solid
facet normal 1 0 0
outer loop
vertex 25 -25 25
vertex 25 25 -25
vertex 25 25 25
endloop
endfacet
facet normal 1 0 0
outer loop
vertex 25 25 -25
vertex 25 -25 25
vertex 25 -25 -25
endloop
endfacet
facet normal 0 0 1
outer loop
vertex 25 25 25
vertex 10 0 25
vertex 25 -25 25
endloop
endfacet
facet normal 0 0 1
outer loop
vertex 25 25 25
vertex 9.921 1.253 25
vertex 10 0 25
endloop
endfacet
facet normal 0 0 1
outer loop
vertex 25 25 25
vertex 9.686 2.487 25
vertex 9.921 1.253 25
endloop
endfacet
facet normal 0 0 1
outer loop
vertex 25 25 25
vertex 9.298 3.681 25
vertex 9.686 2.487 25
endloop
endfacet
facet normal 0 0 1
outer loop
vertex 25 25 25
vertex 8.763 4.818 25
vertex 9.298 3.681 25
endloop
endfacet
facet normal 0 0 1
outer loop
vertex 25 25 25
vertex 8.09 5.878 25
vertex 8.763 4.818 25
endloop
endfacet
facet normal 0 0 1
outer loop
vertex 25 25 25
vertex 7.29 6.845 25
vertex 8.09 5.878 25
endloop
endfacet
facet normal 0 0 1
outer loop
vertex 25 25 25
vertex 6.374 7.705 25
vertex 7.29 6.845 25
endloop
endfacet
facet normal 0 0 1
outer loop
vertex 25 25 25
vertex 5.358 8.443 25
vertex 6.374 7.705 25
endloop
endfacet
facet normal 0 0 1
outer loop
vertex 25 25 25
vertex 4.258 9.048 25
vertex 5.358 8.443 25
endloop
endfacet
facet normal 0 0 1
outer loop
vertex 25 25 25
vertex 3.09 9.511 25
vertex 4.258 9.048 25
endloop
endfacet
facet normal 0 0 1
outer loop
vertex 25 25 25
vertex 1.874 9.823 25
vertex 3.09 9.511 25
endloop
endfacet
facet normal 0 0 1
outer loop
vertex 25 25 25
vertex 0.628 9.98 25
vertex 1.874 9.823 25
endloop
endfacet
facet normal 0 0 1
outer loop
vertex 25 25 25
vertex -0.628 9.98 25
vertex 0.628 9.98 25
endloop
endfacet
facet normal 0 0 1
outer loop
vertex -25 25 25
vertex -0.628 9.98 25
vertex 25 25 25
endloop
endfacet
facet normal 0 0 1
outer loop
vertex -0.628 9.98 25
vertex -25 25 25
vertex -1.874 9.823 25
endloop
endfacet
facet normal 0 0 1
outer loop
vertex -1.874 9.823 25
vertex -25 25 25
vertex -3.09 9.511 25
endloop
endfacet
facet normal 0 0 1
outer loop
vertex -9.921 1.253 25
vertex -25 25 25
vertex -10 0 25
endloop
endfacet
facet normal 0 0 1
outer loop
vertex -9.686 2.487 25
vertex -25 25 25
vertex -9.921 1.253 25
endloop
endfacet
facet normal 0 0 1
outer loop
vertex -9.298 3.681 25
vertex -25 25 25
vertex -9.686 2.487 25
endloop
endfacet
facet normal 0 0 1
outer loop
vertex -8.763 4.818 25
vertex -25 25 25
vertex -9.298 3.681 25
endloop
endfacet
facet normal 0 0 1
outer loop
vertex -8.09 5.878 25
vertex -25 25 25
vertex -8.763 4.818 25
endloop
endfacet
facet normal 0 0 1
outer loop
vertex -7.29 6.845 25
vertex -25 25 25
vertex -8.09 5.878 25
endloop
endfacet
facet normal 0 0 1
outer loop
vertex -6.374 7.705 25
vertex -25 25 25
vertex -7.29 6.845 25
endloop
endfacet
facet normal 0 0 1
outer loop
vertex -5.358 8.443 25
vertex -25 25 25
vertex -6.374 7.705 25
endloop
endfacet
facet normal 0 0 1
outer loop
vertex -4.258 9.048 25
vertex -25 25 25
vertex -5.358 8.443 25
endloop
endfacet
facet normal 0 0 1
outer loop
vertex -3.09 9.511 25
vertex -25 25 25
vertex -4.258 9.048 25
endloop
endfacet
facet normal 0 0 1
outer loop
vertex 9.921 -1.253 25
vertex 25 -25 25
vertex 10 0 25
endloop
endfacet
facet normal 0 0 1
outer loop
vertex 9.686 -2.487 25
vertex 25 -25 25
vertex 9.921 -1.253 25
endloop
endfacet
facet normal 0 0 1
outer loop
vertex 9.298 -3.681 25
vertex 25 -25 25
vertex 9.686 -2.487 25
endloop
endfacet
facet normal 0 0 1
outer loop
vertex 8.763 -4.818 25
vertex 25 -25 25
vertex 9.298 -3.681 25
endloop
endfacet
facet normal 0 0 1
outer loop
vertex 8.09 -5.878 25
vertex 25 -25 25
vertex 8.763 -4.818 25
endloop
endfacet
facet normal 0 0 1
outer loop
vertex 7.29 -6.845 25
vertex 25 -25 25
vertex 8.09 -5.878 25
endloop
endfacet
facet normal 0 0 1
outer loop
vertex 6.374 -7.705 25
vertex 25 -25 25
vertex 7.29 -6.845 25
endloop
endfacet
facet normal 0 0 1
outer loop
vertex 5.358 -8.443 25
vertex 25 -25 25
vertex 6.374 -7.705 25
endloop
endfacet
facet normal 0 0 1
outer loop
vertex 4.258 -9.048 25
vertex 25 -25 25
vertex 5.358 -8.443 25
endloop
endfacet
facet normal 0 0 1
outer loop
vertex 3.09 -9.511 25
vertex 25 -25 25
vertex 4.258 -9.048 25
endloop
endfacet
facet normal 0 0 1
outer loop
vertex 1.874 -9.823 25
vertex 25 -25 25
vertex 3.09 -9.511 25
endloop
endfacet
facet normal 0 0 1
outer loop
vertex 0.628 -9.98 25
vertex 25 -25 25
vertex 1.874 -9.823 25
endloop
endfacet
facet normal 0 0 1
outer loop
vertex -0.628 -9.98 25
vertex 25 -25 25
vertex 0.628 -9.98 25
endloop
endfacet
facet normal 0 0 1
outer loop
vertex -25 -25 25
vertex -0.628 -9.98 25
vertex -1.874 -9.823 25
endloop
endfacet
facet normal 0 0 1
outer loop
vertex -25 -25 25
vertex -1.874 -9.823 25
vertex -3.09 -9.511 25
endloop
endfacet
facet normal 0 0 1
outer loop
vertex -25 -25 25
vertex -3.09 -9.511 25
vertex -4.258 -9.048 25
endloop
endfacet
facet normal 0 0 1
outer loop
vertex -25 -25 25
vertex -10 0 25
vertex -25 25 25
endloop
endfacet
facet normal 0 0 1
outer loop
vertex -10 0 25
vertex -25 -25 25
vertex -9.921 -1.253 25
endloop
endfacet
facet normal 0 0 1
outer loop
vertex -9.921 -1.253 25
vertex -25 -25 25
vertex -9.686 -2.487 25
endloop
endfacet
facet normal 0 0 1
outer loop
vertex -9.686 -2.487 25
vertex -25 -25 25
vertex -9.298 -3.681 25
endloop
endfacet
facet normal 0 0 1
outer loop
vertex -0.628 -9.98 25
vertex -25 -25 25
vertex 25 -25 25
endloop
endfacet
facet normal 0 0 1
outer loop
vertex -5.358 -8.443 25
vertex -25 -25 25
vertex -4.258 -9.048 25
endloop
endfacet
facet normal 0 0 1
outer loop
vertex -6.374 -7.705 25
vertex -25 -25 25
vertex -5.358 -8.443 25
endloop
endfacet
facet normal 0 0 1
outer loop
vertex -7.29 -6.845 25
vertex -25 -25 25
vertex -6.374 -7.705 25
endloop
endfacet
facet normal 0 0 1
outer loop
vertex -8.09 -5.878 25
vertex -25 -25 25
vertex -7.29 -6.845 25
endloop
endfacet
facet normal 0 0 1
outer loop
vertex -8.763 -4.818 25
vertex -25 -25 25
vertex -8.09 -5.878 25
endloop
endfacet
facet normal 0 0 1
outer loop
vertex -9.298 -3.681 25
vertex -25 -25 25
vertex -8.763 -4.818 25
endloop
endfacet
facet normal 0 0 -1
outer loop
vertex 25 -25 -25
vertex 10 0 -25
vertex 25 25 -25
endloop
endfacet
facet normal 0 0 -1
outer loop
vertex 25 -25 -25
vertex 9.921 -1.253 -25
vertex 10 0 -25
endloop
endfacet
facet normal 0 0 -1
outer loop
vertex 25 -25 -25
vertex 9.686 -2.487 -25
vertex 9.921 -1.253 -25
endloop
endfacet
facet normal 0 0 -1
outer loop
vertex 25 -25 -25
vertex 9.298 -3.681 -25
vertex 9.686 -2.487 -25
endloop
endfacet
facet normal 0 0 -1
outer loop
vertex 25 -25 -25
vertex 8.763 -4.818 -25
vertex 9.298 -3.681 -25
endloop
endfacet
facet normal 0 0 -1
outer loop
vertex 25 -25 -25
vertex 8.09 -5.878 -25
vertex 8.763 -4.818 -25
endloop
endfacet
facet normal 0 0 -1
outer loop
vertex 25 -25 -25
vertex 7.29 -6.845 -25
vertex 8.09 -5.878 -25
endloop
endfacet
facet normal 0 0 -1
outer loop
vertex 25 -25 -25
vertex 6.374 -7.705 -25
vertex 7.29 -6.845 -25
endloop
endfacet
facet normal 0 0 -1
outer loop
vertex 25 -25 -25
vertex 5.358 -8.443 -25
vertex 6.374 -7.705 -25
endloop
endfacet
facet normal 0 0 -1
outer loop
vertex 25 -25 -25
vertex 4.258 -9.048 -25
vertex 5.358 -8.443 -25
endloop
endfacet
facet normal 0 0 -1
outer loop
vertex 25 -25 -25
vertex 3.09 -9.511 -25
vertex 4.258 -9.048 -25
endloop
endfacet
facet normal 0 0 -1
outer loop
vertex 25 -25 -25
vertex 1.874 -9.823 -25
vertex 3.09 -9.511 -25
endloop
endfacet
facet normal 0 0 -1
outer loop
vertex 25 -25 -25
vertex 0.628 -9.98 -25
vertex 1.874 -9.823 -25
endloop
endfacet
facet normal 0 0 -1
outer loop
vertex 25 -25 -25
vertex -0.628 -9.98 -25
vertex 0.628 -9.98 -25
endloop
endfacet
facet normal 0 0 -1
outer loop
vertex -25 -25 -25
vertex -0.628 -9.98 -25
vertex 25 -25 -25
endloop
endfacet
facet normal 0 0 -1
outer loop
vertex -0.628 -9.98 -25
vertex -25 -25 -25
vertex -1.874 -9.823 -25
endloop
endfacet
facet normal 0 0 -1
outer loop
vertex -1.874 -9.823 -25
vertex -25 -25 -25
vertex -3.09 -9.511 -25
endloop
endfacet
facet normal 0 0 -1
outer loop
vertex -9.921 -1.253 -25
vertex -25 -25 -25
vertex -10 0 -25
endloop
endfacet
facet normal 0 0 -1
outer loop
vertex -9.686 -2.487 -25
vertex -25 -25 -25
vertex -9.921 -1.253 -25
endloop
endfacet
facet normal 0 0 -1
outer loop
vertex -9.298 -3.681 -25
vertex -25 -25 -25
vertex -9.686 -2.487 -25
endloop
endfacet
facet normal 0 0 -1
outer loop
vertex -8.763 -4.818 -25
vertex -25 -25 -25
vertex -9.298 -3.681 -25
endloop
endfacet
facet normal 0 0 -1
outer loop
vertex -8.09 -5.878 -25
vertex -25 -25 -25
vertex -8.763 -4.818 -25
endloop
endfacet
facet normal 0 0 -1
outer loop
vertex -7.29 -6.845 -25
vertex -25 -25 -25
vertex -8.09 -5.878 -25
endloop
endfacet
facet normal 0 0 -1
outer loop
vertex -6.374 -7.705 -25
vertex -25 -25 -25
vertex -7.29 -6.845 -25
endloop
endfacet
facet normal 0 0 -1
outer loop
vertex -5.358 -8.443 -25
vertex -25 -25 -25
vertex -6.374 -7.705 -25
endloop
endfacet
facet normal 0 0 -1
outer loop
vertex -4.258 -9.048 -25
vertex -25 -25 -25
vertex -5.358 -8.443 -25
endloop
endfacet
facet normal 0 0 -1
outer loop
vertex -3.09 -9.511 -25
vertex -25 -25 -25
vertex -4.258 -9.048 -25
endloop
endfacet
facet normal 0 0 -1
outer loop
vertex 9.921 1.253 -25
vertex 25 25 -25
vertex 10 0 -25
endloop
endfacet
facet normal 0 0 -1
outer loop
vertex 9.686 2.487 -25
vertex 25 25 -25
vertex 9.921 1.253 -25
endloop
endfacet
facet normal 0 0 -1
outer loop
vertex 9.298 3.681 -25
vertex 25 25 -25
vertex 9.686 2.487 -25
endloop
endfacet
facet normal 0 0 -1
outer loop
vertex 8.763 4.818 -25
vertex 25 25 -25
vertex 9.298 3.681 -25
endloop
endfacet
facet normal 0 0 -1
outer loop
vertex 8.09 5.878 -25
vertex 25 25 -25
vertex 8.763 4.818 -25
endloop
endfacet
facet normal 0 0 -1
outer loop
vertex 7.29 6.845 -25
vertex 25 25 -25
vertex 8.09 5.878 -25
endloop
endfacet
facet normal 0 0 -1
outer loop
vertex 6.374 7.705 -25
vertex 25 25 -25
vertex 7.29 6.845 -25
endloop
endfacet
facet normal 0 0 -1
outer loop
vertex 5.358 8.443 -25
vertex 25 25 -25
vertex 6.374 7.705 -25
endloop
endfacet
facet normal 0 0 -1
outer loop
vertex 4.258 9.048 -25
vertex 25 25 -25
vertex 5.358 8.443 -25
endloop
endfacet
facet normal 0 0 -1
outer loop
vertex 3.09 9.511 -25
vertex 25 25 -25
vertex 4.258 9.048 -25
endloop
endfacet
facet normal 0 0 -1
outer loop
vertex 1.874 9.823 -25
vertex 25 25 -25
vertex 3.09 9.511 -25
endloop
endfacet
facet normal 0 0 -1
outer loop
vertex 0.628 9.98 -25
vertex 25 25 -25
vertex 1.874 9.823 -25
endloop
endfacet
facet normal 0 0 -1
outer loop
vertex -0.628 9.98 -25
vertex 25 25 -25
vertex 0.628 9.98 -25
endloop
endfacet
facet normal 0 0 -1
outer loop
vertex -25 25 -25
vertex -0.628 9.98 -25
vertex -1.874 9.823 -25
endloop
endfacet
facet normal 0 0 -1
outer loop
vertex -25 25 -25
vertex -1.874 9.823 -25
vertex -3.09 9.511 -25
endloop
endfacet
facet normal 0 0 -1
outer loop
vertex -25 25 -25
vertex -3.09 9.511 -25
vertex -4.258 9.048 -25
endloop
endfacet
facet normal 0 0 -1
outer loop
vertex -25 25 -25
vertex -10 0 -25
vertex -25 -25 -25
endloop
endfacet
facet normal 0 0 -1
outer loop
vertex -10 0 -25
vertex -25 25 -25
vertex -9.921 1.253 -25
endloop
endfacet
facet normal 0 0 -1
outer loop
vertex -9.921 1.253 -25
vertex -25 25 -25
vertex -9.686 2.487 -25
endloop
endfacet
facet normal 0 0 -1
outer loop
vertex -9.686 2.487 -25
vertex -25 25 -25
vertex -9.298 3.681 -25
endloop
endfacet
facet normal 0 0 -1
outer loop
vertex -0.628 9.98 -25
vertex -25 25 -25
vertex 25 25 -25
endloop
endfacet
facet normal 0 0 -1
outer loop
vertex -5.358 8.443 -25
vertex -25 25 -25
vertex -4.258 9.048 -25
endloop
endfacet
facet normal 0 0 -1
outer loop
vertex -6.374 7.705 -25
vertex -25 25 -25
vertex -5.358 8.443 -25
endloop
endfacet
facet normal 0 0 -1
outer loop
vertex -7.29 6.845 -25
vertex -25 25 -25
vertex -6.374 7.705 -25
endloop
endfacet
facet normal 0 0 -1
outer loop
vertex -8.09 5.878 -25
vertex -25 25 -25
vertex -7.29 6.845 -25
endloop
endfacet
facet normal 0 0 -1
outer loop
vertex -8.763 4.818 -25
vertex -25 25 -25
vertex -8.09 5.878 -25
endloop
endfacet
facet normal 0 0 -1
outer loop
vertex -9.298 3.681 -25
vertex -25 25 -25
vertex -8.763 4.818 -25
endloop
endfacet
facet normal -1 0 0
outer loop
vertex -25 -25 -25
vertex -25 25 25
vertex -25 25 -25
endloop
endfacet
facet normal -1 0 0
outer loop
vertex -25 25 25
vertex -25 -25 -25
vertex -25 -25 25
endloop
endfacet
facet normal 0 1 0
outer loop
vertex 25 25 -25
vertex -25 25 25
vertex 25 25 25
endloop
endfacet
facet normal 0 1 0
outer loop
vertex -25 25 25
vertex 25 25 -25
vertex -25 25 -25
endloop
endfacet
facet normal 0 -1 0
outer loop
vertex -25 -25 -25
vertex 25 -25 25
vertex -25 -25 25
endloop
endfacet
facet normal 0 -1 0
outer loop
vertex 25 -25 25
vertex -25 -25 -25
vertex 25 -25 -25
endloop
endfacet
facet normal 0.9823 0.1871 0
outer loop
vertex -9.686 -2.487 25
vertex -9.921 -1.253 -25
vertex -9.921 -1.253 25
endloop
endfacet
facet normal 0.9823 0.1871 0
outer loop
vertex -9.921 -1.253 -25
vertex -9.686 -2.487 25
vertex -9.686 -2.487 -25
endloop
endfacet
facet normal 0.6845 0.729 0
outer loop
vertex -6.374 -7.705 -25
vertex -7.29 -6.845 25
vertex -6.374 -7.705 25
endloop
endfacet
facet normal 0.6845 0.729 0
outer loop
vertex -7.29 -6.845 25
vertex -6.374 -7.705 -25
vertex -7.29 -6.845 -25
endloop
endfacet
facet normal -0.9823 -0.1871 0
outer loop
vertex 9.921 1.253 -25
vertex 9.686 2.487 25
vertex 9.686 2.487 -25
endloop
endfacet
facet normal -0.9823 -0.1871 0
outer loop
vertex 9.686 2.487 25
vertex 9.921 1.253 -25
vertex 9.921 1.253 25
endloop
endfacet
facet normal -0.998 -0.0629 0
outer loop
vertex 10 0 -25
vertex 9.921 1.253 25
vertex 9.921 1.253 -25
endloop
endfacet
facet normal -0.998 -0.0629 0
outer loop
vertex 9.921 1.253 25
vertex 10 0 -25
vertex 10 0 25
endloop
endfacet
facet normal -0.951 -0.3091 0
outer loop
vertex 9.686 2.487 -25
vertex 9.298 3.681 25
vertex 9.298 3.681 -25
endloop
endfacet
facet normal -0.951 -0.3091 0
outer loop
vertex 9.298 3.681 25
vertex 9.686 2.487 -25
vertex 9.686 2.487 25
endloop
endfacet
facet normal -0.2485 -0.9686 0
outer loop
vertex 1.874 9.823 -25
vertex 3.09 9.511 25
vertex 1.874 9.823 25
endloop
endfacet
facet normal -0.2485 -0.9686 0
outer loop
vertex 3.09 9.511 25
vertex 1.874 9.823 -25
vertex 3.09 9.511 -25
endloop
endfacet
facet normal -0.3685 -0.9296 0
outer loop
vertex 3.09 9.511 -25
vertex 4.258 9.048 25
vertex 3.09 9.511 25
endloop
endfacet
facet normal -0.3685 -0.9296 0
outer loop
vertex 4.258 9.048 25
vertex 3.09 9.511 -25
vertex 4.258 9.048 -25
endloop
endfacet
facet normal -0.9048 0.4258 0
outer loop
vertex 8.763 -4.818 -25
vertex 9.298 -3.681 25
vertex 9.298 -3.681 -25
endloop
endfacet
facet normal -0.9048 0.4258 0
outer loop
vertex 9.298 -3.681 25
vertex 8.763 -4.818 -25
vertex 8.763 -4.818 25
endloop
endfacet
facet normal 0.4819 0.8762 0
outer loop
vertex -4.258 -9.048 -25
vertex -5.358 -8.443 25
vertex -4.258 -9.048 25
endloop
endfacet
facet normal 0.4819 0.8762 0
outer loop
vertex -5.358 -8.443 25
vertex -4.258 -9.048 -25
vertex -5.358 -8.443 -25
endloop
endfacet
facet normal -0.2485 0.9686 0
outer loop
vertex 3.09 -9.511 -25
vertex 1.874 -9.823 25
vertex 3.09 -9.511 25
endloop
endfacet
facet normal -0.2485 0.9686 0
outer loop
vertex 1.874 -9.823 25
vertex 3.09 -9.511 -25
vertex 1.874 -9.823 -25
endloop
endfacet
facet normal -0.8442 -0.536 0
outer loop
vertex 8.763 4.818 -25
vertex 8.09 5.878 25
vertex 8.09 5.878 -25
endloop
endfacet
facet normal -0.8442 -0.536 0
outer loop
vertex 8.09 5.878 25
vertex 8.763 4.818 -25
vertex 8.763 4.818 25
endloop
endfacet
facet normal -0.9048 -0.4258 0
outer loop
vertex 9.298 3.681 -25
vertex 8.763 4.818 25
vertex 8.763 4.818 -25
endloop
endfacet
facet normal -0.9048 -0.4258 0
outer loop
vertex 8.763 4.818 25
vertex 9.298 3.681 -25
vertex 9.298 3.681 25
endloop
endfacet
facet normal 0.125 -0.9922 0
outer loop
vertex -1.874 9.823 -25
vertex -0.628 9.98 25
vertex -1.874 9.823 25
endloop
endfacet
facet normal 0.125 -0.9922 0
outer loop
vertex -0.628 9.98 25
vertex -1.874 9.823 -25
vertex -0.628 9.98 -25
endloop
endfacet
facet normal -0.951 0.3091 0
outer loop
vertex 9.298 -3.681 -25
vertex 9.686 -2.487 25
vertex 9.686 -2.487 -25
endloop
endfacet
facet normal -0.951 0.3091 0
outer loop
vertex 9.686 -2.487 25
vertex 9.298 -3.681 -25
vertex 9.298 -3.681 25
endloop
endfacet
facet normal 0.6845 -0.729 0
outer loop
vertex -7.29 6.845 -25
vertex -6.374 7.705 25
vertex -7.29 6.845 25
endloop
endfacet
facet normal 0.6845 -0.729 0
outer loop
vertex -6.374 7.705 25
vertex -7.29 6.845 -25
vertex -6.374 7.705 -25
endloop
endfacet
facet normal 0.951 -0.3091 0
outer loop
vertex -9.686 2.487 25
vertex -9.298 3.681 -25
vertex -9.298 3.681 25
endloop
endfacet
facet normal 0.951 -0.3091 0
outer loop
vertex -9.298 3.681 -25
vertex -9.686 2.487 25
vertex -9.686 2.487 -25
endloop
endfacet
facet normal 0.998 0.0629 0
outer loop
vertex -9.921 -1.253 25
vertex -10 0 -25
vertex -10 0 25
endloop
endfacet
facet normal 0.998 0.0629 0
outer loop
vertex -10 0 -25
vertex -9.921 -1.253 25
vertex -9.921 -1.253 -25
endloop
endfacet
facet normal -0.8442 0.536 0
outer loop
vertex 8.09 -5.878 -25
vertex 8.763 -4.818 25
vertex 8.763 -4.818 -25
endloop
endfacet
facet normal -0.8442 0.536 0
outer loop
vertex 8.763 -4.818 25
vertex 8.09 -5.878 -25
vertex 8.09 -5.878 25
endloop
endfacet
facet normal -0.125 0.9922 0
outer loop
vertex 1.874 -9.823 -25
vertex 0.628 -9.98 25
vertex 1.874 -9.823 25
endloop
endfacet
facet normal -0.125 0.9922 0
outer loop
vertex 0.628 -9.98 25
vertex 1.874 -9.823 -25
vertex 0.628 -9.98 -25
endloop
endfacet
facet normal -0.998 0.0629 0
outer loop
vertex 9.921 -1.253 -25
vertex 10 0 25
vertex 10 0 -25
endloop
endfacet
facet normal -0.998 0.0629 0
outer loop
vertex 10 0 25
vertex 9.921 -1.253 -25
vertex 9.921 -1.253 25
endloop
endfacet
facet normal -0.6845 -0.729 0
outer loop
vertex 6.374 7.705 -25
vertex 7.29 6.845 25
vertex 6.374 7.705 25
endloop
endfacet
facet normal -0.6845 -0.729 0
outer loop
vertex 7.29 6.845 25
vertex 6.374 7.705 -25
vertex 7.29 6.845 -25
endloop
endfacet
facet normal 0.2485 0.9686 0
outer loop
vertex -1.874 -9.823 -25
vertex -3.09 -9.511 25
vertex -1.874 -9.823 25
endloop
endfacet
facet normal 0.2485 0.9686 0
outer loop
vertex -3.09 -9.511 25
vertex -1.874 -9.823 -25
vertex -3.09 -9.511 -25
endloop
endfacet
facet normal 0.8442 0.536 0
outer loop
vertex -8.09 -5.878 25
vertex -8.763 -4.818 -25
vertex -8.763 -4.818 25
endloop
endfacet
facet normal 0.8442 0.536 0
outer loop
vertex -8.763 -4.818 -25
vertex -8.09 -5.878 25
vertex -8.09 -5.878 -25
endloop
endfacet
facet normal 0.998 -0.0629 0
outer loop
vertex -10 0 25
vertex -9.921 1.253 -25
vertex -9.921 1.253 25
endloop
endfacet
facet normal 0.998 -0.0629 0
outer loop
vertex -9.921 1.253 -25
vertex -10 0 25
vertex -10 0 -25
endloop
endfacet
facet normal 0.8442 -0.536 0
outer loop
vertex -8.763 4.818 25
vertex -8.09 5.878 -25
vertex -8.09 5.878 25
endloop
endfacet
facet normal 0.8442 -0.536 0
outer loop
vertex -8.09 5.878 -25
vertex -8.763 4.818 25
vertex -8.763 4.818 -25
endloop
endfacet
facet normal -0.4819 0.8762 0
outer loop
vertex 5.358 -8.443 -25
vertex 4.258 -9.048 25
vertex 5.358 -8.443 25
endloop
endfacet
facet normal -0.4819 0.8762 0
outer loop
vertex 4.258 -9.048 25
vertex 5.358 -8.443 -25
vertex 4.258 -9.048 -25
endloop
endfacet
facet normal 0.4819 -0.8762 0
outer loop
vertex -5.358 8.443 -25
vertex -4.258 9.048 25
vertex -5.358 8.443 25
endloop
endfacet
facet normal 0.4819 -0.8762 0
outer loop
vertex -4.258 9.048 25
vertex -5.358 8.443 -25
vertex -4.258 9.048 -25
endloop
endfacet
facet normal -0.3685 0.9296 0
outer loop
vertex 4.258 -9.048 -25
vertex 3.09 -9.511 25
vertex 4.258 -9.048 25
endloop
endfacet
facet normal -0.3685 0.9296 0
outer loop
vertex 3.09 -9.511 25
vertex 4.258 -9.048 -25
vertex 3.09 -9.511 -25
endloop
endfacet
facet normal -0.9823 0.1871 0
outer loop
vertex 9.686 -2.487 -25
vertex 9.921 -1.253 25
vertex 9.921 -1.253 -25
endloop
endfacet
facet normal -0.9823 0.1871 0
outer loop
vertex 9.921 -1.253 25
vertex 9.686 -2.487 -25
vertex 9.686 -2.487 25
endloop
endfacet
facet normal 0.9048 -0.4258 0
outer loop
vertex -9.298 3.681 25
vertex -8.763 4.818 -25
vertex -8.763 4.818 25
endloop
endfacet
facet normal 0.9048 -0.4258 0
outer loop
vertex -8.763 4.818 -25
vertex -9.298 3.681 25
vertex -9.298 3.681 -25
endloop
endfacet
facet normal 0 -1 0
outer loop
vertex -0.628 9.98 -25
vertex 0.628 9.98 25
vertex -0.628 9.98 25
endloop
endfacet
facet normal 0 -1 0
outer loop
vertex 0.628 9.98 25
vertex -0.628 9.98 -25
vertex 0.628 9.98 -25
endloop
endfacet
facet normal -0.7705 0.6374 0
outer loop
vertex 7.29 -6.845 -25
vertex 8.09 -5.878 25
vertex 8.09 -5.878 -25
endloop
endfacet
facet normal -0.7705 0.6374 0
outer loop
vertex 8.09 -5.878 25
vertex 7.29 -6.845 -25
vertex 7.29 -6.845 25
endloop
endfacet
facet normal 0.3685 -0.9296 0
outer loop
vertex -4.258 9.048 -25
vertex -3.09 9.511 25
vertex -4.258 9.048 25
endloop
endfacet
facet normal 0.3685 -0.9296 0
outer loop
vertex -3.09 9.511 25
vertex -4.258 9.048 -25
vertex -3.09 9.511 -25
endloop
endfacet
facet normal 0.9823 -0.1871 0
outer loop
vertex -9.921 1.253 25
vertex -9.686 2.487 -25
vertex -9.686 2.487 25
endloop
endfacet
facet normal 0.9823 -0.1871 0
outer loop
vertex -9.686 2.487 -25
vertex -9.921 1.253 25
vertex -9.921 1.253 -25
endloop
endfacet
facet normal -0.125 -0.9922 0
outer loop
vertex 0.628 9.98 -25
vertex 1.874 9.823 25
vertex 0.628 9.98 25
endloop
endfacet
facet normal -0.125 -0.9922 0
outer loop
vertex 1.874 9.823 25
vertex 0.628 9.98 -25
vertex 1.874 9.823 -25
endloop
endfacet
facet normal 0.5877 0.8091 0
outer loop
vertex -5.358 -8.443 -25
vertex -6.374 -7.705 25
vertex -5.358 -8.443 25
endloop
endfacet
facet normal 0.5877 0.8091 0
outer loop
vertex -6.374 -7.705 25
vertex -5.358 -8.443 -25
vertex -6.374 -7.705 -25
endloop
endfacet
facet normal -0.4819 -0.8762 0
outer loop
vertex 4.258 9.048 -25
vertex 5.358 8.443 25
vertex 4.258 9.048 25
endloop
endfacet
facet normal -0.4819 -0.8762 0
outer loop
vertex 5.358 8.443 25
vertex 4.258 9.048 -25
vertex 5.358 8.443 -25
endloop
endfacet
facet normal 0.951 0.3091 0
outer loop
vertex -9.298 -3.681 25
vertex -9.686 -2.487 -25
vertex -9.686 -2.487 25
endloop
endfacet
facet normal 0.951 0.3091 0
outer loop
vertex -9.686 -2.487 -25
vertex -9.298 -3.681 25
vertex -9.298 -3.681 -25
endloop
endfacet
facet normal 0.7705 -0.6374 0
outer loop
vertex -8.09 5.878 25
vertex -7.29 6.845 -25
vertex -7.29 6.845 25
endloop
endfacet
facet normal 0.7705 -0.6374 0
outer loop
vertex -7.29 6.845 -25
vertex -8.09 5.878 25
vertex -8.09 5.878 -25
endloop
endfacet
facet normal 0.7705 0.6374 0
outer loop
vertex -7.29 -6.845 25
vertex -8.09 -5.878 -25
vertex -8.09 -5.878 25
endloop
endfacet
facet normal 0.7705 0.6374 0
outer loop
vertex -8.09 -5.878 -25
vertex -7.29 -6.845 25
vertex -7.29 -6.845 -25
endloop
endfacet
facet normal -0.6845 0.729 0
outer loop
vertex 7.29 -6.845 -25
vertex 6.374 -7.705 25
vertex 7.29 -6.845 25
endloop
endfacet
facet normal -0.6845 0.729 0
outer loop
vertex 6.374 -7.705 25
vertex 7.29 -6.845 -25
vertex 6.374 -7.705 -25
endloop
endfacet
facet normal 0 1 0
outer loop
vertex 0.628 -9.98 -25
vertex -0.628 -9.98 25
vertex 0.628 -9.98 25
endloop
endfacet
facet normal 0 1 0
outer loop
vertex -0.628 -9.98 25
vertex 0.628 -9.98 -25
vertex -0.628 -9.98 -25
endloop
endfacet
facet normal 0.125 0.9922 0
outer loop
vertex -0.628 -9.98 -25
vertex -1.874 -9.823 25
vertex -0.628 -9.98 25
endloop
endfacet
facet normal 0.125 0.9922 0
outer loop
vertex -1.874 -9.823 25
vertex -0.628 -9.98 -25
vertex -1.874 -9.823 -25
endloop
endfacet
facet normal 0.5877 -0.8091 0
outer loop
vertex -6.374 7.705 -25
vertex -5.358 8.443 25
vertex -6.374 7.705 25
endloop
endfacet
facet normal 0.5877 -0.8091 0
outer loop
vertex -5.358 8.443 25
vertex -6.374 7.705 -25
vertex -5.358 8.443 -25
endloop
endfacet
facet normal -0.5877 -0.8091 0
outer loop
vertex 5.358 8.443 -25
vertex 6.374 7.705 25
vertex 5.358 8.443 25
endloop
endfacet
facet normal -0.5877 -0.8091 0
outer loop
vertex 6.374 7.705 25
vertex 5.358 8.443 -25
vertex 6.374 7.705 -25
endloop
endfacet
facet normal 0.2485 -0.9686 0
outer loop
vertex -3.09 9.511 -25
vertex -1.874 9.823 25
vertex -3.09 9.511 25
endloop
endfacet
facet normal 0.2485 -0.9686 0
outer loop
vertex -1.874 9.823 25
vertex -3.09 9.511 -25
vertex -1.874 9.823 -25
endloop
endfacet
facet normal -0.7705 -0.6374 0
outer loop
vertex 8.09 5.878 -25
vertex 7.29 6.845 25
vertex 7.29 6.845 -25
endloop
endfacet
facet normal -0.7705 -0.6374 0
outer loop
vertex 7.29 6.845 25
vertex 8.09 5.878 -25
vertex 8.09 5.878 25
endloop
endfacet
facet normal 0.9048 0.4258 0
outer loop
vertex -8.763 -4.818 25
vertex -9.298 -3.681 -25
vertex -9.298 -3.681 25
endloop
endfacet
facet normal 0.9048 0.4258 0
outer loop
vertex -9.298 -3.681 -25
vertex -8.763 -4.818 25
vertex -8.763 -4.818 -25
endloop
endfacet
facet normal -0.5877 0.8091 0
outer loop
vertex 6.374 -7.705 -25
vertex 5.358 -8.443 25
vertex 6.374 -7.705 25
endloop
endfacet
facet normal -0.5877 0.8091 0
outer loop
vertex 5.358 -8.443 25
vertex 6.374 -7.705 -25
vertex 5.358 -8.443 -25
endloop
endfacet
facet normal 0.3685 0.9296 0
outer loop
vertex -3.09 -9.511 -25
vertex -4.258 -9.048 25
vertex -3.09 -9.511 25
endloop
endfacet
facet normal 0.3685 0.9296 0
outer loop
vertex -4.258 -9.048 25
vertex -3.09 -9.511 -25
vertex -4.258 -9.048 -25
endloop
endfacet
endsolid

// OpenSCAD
difference() {
    cube(50, center=true);
    cylinder(h=60, d=20, center=true, $fn=50);
}
